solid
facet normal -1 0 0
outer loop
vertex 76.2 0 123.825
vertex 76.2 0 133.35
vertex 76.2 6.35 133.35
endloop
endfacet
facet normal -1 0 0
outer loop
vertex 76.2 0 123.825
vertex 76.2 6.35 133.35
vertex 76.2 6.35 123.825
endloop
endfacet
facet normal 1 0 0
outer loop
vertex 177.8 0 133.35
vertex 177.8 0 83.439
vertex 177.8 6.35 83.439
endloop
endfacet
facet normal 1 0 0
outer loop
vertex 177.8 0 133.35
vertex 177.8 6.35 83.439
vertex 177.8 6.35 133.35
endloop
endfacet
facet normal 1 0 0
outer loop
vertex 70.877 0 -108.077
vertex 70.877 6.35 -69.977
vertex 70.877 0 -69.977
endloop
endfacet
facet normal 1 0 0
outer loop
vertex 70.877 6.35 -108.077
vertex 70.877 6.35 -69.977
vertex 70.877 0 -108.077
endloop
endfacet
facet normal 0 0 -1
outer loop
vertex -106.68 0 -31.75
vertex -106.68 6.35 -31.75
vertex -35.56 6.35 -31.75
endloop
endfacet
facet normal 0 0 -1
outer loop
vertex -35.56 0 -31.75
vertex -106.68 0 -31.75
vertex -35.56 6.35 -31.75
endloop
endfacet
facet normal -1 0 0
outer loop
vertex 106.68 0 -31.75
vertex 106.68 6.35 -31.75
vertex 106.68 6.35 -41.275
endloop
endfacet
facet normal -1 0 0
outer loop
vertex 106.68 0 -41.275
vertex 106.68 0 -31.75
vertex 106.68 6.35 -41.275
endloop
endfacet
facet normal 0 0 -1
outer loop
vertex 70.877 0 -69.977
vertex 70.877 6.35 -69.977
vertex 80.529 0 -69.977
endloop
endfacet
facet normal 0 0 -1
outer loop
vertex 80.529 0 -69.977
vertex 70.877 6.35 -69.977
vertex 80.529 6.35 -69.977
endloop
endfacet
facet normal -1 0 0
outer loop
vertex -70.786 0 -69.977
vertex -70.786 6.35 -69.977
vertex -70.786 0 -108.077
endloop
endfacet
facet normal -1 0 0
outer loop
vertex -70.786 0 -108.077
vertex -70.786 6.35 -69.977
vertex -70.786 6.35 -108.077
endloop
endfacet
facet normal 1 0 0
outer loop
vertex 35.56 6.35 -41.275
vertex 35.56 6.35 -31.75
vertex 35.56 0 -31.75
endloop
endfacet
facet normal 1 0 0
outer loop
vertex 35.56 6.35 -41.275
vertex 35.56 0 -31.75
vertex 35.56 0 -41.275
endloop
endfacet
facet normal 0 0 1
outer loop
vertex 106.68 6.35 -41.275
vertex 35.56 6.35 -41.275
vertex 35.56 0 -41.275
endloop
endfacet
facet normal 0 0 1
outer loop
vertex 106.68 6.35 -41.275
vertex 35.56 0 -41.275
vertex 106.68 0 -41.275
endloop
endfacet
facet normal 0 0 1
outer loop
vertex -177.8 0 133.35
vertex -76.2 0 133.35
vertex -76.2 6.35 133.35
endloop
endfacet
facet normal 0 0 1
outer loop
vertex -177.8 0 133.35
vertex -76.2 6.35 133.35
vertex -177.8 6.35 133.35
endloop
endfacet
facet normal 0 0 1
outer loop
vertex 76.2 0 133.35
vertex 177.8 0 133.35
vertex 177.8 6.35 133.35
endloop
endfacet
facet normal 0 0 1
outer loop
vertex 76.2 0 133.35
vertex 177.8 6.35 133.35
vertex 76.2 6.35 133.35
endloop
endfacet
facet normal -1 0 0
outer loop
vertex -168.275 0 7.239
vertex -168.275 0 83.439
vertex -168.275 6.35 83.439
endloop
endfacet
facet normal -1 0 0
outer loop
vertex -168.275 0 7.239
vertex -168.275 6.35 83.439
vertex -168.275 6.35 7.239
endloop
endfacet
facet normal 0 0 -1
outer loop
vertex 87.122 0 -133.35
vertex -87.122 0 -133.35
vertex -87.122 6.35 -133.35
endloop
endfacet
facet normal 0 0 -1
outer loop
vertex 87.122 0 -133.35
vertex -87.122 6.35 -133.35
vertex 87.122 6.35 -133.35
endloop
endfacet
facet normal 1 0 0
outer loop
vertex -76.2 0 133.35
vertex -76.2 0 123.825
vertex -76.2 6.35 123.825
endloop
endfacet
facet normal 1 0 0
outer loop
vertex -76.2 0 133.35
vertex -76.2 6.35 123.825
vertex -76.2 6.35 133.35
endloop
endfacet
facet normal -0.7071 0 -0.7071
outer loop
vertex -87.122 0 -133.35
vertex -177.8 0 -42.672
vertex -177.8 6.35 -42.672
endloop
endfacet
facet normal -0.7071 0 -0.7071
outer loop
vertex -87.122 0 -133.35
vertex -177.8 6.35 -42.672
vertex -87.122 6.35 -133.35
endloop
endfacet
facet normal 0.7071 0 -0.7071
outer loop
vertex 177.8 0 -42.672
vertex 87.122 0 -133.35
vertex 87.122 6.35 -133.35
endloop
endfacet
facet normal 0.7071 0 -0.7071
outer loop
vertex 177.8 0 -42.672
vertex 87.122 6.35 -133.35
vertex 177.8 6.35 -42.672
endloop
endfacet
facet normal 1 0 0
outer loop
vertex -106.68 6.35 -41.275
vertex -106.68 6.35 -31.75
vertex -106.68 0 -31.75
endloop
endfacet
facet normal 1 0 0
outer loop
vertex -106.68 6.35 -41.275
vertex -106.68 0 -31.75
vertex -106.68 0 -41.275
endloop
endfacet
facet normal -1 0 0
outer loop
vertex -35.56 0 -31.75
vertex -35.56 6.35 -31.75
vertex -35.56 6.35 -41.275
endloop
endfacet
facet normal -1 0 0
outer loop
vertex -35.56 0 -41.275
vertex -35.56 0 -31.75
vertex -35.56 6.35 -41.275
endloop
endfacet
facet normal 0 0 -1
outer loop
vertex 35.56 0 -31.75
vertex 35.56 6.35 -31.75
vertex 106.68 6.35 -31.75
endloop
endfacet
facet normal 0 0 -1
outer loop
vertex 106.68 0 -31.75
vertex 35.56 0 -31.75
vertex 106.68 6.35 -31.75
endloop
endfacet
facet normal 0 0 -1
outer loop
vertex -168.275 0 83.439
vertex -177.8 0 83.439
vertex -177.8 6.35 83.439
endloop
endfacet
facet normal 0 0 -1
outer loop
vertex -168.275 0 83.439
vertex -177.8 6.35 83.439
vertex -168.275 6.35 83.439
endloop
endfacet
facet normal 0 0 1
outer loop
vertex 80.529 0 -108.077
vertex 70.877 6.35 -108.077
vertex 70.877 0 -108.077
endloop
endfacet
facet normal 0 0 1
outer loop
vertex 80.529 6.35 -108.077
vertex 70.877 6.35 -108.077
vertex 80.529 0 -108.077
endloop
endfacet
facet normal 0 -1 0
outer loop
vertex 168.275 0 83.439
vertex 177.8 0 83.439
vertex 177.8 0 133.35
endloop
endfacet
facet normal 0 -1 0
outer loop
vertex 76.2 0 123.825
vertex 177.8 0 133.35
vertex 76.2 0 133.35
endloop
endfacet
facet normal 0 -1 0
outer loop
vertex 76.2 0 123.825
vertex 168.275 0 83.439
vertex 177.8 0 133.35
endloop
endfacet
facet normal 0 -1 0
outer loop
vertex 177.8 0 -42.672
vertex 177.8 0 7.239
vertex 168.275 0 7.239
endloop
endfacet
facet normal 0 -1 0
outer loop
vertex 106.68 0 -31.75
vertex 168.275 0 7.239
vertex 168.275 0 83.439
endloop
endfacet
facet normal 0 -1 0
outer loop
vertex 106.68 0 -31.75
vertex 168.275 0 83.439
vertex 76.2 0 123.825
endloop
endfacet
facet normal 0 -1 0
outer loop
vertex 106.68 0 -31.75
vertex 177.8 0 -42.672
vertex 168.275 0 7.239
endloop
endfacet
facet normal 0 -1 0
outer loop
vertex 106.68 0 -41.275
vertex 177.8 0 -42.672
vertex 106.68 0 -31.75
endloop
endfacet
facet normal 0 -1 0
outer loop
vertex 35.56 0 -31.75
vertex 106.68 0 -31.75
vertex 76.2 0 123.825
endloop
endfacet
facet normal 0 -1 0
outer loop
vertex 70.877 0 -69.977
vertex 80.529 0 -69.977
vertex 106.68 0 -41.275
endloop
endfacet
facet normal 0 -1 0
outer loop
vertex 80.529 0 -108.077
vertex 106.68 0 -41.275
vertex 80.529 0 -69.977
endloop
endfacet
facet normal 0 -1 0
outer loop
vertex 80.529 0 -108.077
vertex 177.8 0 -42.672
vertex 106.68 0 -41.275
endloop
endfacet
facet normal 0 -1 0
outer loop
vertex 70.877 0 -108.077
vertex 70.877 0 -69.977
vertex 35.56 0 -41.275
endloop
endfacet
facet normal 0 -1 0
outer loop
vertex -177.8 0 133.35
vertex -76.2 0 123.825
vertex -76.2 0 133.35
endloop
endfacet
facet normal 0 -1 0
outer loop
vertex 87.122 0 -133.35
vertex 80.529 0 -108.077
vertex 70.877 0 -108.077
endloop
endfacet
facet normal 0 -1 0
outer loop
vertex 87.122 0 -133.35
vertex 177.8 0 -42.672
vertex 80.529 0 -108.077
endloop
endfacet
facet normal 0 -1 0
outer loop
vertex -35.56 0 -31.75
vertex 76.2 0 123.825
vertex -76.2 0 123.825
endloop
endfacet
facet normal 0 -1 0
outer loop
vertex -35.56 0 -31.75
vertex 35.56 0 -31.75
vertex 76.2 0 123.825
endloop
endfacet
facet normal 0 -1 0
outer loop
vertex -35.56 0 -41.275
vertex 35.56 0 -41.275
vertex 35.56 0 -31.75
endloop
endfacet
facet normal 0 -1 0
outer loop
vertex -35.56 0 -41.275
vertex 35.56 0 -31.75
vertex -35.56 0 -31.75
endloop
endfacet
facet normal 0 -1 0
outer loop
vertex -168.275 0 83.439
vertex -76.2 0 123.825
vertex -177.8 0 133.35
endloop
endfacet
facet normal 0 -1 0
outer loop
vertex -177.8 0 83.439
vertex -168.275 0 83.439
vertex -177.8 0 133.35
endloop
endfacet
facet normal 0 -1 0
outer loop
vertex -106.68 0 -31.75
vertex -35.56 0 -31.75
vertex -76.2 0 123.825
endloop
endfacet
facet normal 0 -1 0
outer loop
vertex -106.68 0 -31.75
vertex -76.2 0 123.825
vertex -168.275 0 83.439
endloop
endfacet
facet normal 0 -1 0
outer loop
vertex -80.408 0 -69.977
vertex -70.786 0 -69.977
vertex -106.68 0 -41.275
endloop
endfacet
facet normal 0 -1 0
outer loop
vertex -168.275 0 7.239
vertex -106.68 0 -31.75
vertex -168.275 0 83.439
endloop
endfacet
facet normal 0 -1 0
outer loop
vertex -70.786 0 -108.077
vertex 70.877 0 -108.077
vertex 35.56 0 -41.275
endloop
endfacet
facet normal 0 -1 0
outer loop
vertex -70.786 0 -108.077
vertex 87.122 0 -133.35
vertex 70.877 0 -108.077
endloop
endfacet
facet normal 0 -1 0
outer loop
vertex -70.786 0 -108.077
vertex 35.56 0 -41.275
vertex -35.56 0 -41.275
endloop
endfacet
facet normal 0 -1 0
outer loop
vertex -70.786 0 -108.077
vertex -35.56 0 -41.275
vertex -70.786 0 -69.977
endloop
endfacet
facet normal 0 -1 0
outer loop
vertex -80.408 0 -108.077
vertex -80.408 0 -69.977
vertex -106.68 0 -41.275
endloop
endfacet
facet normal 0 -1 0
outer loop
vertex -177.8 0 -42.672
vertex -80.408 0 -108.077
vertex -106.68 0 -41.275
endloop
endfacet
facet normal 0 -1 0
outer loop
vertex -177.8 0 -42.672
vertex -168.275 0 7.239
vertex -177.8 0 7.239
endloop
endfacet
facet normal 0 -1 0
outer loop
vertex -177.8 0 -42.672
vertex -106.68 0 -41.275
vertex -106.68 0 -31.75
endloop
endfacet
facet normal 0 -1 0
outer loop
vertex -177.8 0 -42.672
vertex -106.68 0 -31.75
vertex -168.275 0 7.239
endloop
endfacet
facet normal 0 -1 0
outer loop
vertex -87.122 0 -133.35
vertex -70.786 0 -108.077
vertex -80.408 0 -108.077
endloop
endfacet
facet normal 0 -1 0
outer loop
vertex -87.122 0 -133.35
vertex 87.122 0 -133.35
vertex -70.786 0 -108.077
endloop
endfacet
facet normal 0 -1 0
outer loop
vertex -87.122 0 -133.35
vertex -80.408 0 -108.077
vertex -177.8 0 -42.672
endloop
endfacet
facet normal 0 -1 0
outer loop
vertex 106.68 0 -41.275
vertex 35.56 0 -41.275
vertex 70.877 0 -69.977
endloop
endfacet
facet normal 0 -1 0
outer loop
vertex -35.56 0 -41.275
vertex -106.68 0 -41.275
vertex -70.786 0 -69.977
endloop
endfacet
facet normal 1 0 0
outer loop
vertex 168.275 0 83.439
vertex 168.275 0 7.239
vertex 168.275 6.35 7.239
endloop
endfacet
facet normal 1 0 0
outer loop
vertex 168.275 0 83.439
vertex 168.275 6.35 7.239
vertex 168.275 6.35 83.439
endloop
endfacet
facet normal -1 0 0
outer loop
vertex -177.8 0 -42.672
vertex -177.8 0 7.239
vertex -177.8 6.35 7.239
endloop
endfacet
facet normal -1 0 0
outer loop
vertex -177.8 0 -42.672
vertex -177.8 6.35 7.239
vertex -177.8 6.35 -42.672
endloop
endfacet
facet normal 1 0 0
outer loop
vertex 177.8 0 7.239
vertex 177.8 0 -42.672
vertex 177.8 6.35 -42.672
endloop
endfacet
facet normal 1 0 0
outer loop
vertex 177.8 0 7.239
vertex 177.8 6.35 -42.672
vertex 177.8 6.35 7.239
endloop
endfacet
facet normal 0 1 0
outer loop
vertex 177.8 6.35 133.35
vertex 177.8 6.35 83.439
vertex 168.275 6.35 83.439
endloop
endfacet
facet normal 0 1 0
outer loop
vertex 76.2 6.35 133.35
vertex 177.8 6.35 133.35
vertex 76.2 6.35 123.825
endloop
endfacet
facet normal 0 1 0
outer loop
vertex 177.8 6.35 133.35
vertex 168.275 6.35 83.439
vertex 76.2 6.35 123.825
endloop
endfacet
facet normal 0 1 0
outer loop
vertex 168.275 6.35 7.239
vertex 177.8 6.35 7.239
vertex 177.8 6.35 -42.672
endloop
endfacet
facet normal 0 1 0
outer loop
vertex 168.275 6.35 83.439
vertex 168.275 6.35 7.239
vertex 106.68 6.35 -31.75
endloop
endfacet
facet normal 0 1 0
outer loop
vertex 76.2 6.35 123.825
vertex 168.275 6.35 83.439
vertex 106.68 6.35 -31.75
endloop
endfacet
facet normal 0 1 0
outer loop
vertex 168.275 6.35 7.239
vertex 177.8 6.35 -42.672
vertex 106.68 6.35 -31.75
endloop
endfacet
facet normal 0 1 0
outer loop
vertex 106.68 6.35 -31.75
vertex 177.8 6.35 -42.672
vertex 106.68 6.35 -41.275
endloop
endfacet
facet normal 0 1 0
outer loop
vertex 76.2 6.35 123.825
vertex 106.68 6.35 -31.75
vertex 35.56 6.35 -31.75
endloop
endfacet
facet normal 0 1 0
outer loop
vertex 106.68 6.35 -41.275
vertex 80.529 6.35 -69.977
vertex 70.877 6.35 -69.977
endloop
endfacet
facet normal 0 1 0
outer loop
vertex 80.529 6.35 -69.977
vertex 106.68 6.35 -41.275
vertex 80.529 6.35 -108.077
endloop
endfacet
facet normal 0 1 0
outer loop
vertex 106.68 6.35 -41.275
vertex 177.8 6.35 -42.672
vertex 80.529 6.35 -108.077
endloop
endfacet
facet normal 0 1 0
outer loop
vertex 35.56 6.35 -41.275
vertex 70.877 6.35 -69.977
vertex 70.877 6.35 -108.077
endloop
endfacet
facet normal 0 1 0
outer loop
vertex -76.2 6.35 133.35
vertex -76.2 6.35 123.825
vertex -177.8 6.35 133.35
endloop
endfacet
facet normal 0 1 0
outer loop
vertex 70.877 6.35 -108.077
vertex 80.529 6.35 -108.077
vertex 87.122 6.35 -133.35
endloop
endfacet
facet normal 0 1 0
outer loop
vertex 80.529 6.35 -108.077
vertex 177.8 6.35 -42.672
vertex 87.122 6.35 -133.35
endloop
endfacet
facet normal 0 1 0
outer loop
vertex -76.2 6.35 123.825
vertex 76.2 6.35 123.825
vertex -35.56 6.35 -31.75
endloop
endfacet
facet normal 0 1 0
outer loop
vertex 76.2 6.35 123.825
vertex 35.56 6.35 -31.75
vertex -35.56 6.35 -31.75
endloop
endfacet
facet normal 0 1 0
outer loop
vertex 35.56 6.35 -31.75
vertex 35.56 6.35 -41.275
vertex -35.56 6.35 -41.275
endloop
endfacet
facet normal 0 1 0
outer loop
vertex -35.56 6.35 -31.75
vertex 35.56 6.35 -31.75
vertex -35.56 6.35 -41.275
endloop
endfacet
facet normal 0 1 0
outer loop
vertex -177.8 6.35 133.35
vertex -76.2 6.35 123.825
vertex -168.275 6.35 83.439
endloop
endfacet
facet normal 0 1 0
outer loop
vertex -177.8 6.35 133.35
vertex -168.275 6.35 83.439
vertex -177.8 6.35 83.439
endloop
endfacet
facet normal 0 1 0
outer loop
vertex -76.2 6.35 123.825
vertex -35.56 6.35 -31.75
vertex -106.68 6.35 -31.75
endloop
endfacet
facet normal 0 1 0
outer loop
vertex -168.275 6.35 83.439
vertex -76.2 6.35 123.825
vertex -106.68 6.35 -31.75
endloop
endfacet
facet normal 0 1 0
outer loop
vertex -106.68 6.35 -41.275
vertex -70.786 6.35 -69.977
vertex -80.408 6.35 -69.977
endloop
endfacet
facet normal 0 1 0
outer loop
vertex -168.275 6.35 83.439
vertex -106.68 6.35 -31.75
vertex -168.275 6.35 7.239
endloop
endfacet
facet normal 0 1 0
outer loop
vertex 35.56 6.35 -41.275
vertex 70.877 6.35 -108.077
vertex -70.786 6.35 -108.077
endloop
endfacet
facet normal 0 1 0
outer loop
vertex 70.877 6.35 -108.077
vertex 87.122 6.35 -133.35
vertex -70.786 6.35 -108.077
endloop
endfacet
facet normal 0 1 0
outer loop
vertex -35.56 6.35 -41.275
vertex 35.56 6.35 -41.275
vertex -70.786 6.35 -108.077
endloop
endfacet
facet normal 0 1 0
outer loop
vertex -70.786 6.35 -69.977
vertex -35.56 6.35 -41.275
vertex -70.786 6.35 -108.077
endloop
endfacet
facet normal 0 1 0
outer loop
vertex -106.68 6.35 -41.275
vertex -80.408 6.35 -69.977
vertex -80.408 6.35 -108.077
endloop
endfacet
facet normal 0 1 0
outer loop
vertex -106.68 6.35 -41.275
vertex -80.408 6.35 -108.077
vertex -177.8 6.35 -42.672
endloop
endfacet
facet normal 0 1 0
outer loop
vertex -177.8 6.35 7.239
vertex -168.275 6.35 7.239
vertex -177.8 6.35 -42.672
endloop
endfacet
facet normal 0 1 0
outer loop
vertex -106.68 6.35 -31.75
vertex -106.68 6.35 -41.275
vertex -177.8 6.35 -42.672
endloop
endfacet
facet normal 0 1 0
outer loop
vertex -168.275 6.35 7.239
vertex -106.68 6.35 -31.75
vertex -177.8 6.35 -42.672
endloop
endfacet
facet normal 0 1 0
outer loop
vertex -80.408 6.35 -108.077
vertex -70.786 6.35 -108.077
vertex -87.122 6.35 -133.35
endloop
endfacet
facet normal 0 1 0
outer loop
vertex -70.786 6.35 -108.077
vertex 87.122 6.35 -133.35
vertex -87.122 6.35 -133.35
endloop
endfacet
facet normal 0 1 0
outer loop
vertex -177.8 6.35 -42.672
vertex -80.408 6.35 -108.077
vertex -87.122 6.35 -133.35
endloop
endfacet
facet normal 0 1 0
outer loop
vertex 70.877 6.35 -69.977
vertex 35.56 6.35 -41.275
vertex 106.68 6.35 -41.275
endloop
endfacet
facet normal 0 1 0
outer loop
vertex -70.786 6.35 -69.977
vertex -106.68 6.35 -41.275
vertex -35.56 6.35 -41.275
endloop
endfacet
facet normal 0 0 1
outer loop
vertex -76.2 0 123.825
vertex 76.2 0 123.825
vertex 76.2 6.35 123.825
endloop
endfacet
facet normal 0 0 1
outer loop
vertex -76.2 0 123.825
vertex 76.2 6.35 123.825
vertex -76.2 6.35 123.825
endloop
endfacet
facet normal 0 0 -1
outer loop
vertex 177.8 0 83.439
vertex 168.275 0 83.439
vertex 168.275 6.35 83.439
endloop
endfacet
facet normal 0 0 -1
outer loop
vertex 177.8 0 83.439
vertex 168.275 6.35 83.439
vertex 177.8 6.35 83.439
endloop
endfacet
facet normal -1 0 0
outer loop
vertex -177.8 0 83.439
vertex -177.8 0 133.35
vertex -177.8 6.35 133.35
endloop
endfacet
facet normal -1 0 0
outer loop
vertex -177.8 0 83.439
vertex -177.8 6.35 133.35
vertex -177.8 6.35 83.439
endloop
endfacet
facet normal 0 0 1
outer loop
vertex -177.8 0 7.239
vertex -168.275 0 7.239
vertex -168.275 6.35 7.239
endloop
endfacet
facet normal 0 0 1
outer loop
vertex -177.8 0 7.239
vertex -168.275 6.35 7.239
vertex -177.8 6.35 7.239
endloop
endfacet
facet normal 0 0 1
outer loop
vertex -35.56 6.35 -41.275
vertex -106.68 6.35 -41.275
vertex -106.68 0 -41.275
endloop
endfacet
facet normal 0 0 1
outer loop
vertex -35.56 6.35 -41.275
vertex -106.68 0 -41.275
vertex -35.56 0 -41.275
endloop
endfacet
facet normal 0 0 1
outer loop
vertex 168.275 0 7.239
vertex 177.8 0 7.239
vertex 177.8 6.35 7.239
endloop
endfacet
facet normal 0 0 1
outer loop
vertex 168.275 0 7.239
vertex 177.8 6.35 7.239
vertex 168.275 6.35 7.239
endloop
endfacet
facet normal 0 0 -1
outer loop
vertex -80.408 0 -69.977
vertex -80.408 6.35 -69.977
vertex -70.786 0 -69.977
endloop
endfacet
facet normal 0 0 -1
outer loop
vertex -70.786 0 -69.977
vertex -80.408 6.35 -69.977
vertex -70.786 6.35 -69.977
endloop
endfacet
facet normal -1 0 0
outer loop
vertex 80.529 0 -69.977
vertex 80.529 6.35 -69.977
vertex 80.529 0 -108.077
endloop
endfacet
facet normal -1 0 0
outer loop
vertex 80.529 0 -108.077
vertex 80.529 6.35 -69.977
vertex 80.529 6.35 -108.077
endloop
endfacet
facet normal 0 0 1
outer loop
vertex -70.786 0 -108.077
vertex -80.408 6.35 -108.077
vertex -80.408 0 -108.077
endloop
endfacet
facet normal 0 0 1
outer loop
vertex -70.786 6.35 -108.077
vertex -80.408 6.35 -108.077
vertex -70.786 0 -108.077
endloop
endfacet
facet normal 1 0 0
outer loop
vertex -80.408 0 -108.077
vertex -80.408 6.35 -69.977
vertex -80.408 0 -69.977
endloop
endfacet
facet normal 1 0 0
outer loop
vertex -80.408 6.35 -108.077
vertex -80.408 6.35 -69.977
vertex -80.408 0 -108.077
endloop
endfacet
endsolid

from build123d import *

# Parameters (mm, degrees)
BOSS_EXTRUDE1_DEPTH = 6.35
SKETCH2_W           = 71.12
SKETCH2_H           = 9.525
CUT_EXTRUDE1_DEPTH  = 223.34069578
SKETCH3_W           = 9.652
SKETCH3_H           = 38.1
SKETCH3_W_2         = 9.62146782
CUT_EXTRUDE2_DEPTH  = 6.35


with BuildPart() as part:
    # Sketch1 → Boss-Extrude1 (new body)
    with BuildSketch(Plane(origin=(0, 0, 0), x_dir=(1, 0, 0), z_dir=(0, 1, 0))):
        Polygon((-177.8, -7.239), (-177.8, 42.672), (-87.122, 133.35), (87.122, 133.35), (177.8, 42.672), (177.8, -7.239), (168.275, -7.239), (168.275, -83.439), (177.8, -83.439), (177.8, -133.35), (76.2, -133.35), (76.2, -123.825), (-76.2, -123.825), (-76.2, -133.35), (-177.8, -133.35), (-177.8, -83.439), (-168.275, -83.439), (-168.275, -7.239), align=None)
    extrude(amount=BOSS_EXTRUDE1_DEPTH)

    # Sketch2 → Cut-Extrude1 (cut, through all)
    with BuildSketch(Plane(origin=(0, 6.35, 0), x_dir=(1, 0, 0), z_dir=(0, 1, 0))):
        with Locations((71.12, 36.5125)):
            Rectangle(SKETCH2_W, SKETCH2_H)
        with Locations((-71.12, 36.5125)):
            Rectangle(SKETCH2_W, SKETCH2_H)
    extrude(amount=-CUT_EXTRUDE1_DEPTH, mode=Mode.SUBTRACT)

    # Sketch3 → Cut-Extrude2 (cut)
    with BuildSketch(Plane(origin=(0, 6.35, 0), x_dir=(1, 0, 0), z_dir=(0, 1, 0))):
        with Locations((75.702840569, 89.027)):
            Rectangle(SKETCH3_W, SKETCH3_H)
        with Locations((-75.596992051, 89.027)):
            Rectangle(SKETCH3_W_2, SKETCH3_H)
    extrude(amount=-CUT_EXTRUDE2_DEPTH, mode=Mode.SUBTRACT)


solid = part.part
